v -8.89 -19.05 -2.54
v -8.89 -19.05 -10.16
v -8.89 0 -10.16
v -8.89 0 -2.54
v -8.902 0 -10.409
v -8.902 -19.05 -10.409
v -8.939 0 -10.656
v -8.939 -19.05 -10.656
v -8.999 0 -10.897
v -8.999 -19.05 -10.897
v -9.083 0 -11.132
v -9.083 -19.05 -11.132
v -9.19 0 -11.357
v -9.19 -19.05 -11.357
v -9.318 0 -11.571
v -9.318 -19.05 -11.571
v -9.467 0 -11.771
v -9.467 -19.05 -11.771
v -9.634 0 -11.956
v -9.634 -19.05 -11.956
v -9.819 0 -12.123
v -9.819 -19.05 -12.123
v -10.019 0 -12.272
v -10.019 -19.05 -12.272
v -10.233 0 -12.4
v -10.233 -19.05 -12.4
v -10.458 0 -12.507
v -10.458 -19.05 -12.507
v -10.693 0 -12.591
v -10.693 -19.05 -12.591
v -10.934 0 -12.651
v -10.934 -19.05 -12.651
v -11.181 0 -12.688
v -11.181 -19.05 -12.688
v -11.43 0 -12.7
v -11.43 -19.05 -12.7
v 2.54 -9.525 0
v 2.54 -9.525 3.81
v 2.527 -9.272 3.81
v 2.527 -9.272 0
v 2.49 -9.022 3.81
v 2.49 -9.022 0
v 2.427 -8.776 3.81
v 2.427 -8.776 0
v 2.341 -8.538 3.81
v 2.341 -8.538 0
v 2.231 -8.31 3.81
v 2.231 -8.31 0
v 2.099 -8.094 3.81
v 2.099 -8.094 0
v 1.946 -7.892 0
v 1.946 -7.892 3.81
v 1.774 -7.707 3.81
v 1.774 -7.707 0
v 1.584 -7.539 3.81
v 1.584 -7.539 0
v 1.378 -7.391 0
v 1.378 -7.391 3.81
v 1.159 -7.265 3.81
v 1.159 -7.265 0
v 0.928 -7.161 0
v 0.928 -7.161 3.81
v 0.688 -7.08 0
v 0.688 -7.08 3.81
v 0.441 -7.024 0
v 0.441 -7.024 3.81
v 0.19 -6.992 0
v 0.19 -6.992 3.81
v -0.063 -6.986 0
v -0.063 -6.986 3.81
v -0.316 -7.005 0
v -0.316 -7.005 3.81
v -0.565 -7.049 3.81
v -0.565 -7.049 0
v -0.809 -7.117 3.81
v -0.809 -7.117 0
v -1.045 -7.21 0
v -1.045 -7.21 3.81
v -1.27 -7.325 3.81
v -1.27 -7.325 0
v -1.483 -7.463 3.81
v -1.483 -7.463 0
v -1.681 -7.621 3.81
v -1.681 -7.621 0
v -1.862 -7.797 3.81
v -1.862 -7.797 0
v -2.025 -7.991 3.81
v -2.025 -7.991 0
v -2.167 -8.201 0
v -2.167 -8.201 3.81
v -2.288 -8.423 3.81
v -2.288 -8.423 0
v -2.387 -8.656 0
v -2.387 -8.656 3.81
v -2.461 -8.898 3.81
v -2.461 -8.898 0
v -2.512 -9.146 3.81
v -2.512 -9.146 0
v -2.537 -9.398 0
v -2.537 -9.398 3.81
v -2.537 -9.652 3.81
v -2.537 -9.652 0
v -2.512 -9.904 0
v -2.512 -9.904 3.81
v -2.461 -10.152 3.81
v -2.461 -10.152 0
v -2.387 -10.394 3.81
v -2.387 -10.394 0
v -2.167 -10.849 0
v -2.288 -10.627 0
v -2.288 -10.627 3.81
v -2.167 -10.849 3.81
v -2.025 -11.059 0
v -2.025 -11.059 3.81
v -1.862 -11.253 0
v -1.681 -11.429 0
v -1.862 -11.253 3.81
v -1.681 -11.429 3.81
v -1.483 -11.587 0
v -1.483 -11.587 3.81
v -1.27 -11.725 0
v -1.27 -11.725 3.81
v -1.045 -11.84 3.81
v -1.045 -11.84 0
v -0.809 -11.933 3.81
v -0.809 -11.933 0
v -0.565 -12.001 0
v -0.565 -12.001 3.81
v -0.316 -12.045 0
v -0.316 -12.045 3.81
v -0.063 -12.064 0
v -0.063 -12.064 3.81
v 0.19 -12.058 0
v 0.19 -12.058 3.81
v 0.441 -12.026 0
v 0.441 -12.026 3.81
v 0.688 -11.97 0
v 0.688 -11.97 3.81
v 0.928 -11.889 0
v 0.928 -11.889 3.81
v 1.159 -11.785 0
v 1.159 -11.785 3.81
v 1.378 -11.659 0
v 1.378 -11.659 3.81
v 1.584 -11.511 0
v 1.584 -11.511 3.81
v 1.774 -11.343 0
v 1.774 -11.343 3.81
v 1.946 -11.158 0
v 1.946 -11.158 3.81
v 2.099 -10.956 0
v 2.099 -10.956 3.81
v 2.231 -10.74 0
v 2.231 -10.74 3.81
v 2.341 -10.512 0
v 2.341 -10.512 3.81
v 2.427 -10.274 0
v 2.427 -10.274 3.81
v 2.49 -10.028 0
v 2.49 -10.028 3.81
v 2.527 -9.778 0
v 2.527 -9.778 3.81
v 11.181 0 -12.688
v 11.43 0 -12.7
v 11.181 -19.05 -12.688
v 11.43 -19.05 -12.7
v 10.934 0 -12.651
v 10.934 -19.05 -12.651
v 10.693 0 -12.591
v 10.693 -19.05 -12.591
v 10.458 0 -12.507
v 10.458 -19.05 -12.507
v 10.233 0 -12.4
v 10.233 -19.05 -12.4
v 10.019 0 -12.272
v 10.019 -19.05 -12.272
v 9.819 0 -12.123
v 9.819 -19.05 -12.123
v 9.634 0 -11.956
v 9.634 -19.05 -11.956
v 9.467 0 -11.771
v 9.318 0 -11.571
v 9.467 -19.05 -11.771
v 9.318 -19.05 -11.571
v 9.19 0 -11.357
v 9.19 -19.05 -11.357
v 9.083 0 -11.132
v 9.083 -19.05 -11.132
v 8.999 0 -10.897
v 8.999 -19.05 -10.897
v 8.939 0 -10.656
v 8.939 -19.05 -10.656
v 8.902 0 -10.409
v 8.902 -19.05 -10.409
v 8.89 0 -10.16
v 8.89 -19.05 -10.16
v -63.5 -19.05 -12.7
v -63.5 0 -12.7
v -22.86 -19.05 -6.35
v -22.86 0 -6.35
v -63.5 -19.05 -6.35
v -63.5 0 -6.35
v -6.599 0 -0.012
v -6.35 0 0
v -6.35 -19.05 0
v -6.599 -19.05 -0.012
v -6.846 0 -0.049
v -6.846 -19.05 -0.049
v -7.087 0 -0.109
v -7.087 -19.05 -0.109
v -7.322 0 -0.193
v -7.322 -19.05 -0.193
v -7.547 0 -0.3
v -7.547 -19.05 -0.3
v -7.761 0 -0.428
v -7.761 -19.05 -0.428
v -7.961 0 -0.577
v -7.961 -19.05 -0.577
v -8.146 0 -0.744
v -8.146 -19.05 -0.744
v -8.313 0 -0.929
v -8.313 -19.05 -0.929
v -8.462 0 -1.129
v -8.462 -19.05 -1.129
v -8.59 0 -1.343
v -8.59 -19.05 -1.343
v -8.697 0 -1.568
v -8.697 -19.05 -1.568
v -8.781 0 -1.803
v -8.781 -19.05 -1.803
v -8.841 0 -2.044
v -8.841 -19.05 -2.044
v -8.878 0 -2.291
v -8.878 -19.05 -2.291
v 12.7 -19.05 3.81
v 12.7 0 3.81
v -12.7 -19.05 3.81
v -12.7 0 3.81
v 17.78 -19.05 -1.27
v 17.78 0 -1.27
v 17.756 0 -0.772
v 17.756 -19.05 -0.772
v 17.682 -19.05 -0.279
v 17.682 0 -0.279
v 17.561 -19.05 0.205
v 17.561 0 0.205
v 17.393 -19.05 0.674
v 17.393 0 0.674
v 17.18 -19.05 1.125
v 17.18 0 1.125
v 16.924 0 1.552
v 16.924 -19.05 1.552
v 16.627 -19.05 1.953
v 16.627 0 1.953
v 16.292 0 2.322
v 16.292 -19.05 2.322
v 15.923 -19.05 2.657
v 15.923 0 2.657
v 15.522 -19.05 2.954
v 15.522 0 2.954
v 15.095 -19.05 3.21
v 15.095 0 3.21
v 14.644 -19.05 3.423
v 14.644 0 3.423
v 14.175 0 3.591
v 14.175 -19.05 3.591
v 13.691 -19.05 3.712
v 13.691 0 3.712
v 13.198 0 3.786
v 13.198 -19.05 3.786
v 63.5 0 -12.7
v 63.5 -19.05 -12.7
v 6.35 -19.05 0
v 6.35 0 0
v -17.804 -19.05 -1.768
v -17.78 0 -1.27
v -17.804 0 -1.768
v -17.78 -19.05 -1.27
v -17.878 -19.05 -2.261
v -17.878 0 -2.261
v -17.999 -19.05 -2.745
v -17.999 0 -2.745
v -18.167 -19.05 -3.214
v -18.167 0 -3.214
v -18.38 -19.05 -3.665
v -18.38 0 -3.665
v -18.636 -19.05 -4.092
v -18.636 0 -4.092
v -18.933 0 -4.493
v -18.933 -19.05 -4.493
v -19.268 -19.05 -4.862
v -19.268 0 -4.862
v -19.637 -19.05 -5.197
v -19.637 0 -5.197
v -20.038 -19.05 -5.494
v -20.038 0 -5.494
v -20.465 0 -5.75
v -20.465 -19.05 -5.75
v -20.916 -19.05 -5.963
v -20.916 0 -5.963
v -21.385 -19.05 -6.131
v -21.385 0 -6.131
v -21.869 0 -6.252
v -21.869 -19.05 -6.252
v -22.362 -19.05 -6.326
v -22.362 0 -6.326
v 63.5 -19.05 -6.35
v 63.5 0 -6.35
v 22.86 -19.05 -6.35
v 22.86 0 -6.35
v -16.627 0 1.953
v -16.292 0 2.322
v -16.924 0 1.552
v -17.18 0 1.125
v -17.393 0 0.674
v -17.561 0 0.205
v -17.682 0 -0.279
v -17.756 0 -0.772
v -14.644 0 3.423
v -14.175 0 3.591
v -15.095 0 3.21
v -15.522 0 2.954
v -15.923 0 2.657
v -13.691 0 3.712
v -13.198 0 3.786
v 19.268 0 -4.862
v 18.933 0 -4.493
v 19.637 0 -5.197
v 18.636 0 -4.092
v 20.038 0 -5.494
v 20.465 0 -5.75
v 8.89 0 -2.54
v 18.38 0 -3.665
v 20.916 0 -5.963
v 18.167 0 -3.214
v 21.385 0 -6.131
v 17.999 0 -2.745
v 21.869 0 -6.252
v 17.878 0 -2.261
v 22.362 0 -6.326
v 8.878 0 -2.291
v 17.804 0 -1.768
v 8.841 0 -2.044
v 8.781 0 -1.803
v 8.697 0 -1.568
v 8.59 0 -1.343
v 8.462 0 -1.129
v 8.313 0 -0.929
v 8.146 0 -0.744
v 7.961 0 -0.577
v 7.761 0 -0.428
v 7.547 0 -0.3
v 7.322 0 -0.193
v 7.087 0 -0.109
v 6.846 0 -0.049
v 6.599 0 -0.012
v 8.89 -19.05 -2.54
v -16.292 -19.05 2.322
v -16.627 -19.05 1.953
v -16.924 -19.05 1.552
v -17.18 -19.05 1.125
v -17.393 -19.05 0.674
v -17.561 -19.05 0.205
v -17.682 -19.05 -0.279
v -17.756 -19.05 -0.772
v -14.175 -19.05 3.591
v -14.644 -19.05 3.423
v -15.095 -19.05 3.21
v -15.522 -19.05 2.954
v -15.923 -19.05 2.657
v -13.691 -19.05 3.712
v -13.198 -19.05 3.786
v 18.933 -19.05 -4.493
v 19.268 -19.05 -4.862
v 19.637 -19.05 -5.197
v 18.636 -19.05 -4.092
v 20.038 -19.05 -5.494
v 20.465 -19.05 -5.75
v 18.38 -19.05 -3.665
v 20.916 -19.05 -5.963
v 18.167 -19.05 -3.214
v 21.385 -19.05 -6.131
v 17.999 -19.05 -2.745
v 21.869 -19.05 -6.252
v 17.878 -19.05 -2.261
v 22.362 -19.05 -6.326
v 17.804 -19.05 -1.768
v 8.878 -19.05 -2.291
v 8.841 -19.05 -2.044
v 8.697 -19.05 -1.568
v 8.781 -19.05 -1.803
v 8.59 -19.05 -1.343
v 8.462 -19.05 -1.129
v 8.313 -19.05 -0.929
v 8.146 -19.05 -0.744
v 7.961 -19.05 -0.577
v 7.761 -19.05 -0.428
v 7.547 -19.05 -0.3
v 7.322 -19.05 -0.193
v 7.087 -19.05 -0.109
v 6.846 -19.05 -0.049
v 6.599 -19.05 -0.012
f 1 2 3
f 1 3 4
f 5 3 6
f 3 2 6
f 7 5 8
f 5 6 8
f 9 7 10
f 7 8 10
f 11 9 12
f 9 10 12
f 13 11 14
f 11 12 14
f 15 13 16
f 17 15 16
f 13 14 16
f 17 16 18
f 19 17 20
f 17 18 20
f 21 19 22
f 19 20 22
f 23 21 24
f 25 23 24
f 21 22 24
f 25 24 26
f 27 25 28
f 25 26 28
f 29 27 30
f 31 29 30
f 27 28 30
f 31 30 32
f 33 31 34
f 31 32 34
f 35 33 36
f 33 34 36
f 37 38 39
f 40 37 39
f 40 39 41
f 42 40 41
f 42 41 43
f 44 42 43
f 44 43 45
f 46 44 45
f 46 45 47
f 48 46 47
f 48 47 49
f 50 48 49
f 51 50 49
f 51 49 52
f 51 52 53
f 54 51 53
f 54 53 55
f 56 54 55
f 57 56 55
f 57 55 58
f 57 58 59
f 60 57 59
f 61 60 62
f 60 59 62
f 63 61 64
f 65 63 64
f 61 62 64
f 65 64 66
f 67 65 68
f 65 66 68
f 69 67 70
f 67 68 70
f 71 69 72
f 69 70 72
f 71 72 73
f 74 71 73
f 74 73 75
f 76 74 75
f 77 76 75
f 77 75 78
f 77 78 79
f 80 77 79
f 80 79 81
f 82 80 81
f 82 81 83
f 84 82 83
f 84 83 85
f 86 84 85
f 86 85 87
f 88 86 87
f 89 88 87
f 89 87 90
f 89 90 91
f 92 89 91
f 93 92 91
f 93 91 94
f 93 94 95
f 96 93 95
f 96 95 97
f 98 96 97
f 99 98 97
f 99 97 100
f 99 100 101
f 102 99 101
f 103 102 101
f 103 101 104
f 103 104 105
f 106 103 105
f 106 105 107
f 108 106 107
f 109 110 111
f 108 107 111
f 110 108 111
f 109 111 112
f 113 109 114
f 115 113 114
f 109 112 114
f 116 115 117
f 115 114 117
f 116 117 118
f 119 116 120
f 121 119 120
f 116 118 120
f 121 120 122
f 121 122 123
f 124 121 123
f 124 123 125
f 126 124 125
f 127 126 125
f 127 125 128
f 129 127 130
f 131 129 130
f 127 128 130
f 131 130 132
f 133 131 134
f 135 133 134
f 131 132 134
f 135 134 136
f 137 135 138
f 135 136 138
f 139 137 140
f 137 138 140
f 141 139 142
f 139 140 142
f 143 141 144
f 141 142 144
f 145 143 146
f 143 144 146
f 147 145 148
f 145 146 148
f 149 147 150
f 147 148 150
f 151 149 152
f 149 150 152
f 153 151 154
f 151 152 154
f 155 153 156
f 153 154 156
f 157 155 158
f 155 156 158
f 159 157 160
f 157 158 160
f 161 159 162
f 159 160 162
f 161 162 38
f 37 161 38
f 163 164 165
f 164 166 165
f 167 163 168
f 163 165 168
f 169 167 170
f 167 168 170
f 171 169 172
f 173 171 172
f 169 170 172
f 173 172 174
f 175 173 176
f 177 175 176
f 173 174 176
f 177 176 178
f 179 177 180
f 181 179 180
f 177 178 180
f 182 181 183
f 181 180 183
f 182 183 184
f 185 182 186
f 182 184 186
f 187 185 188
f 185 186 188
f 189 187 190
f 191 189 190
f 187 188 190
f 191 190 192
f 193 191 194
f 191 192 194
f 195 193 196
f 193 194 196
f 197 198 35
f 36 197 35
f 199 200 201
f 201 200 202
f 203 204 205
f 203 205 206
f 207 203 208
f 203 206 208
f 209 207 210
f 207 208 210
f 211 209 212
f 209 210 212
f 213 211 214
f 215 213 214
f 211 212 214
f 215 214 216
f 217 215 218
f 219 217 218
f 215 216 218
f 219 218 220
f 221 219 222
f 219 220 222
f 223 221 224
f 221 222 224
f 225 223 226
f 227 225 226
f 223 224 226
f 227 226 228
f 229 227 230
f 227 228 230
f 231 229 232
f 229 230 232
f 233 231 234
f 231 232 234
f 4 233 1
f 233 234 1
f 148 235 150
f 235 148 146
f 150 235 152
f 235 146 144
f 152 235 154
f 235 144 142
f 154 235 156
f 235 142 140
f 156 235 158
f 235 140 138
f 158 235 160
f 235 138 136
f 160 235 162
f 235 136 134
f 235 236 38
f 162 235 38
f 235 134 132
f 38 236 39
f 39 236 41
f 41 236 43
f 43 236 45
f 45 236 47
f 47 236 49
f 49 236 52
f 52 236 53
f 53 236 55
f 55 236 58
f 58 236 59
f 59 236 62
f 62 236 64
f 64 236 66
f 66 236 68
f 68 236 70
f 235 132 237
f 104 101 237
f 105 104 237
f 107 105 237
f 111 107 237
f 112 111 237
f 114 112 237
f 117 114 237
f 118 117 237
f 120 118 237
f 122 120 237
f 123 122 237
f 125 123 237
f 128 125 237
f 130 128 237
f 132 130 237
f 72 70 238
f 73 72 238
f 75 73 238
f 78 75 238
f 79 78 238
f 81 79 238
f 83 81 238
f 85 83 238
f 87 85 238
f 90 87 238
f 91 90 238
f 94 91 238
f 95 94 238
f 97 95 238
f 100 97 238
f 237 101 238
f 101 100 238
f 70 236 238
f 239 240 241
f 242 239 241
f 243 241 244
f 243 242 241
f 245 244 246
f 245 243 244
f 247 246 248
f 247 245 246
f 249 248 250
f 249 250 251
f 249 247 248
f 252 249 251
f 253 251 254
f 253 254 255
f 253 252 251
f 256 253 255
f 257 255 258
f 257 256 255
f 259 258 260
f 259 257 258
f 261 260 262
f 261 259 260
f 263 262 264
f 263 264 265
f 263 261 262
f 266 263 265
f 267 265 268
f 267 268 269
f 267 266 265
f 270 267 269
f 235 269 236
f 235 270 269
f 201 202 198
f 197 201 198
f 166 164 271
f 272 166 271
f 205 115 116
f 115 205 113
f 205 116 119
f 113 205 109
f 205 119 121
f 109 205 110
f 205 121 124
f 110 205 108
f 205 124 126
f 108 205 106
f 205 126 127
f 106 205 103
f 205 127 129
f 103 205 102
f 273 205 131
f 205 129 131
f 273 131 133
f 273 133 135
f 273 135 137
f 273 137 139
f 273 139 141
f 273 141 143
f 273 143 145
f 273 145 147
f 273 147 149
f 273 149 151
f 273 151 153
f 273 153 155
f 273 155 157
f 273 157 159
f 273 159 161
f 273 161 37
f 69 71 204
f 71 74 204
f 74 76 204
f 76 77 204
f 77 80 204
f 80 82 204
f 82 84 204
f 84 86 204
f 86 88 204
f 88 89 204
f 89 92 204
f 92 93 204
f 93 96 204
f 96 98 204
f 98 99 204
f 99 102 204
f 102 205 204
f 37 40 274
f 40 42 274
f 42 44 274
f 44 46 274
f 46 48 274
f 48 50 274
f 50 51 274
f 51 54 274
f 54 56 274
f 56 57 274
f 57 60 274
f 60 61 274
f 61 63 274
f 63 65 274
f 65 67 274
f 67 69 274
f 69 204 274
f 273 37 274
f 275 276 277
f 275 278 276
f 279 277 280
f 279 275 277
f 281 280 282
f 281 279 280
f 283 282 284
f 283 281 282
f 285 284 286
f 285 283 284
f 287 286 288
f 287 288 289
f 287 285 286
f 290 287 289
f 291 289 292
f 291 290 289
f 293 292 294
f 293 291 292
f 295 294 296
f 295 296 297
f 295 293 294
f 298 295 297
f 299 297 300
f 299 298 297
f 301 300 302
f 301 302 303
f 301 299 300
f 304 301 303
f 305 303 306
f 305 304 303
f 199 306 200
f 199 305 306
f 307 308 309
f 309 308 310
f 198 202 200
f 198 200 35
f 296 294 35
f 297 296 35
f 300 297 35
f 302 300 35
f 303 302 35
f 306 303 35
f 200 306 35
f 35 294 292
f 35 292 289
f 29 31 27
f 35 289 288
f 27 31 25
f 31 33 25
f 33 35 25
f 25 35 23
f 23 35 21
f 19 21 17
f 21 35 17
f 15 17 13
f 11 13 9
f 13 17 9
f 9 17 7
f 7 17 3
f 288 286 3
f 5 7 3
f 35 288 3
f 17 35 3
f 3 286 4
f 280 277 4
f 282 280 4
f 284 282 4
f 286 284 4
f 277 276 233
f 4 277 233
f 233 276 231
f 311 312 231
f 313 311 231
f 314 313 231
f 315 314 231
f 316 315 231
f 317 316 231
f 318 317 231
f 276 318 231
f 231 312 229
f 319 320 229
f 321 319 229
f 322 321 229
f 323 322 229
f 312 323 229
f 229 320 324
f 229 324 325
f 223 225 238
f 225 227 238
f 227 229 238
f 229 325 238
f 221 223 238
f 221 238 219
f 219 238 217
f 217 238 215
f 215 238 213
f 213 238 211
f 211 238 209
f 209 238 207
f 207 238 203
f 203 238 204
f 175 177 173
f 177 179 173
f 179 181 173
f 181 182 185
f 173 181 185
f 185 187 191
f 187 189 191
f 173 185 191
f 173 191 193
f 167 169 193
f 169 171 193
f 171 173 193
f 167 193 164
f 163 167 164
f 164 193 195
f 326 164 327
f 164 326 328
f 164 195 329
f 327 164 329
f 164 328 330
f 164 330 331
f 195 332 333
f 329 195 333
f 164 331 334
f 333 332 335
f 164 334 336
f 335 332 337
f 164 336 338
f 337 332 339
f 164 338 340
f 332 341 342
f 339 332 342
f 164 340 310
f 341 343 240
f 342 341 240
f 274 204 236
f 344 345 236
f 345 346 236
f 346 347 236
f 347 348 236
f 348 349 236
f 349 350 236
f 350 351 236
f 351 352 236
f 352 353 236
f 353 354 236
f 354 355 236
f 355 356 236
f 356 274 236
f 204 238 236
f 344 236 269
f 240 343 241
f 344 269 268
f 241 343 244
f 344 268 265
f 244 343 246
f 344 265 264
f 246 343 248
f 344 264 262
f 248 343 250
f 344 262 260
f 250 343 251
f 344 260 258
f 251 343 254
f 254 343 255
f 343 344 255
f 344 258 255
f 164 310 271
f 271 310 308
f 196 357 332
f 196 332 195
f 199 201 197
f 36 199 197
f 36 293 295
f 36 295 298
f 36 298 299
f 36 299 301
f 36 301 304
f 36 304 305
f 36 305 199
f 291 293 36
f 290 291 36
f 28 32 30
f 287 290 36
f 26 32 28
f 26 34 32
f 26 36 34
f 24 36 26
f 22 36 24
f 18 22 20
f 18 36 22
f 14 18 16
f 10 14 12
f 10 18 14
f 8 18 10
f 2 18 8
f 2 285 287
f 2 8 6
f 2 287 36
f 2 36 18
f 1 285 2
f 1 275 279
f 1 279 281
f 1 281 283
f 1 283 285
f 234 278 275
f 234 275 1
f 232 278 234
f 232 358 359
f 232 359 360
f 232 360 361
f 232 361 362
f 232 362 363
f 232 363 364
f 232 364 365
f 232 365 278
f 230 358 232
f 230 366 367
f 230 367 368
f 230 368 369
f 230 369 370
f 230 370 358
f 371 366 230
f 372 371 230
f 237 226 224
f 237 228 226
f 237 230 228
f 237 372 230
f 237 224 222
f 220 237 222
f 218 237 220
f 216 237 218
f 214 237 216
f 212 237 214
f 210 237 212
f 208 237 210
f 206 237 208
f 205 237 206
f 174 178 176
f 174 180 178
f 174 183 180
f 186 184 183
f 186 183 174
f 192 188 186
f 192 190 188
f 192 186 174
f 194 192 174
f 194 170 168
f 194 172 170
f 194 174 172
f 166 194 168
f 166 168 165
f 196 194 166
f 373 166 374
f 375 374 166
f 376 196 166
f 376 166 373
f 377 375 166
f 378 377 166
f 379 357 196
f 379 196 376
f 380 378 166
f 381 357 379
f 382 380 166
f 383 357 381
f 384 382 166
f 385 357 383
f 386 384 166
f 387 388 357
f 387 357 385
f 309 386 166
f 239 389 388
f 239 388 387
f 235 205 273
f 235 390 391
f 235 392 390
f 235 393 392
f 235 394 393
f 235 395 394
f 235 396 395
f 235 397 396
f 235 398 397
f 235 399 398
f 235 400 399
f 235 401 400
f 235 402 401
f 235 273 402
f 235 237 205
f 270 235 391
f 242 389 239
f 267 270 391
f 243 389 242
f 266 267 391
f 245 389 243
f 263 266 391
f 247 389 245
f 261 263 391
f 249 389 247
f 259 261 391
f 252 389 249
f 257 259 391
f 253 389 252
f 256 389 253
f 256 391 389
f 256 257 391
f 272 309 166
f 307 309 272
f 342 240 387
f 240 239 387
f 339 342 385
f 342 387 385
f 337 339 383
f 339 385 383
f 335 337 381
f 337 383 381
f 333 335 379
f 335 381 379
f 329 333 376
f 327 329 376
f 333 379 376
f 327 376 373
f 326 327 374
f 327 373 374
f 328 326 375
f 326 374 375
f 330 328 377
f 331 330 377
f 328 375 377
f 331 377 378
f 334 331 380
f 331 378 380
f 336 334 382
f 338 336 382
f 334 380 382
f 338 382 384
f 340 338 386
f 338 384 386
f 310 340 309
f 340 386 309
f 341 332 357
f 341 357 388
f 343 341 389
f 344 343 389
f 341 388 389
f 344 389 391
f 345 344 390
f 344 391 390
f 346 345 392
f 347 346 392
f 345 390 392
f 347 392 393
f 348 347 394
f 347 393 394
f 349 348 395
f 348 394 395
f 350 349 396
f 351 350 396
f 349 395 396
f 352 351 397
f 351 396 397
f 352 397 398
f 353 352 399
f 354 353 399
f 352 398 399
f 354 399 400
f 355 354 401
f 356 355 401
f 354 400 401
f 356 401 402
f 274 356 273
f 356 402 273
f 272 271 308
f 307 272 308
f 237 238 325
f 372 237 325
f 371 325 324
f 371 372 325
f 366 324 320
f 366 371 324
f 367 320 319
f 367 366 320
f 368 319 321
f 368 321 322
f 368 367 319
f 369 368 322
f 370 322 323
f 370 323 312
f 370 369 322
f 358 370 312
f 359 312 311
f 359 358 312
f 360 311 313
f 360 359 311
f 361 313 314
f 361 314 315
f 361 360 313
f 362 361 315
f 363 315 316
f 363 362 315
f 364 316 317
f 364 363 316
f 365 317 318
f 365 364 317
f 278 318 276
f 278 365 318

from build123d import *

# Parameters (mm, degrees)
F1_DEPTH = 19.05
F2_R     = 5.07999
F3_R     = 2.54
F4_DEPTH = 25.4
F5_R     = 2.54


# Not quite as in the source:
# - a fillet or chamfer is up to 0.001 mm smaller than in the source, because OpenCascade refuses the exact size


with BuildPart() as f1:
    # F0 (on Front) → F1 (new body)
    with BuildSketch(Plane.XZ):
        Polygon((17.78, -6.35), (17.78, 3.81), (-17.78, 3.81), (-17.78, -6.35), (-63.5, -6.35), (-63.5, -12.7), (-8.89, -12.7), (-8.89, 0), (8.89, 0), (8.89, -12.7), (63.5, -12.7), (63.5, -6.35), align=None)
    extrude(amount=F1_DEPTH)

    # F2 (radius 5.08 in the source; OpenCascade refuses exactly that, so slightly less here)
    f2_edges = [f1.edges().sort_by_distance(p)[0] for p in [
        (17.78, -9.525, 3.81),
        (17.78, -9.525, -6.35),
        (-17.78, -9.525, 3.81),
        (-17.78, -9.525, -6.35),
    ]]
    fillet(f2_edges, radius=F2_R)

    # F3 (on face) → F4 (cut)
    with BuildSketch(Plane.XY.offset(3.81)):
        with Locations((0, -9.525)):
            Circle(F3_R)
    extrude(amount=-F4_DEPTH, mode=Mode.SUBTRACT)

    # F5
    f5_edges = [f1.edges().sort_by_distance(p)[0] for p in [
        (8.89, -9.525, 0),
        (-8.89, -9.525, 0),
        (-8.89, -9.525, -12.7),
        (8.89, -9.525, -12.7),
    ]]
    fillet(f5_edges, radius=F5_R)


solid = f1.part
